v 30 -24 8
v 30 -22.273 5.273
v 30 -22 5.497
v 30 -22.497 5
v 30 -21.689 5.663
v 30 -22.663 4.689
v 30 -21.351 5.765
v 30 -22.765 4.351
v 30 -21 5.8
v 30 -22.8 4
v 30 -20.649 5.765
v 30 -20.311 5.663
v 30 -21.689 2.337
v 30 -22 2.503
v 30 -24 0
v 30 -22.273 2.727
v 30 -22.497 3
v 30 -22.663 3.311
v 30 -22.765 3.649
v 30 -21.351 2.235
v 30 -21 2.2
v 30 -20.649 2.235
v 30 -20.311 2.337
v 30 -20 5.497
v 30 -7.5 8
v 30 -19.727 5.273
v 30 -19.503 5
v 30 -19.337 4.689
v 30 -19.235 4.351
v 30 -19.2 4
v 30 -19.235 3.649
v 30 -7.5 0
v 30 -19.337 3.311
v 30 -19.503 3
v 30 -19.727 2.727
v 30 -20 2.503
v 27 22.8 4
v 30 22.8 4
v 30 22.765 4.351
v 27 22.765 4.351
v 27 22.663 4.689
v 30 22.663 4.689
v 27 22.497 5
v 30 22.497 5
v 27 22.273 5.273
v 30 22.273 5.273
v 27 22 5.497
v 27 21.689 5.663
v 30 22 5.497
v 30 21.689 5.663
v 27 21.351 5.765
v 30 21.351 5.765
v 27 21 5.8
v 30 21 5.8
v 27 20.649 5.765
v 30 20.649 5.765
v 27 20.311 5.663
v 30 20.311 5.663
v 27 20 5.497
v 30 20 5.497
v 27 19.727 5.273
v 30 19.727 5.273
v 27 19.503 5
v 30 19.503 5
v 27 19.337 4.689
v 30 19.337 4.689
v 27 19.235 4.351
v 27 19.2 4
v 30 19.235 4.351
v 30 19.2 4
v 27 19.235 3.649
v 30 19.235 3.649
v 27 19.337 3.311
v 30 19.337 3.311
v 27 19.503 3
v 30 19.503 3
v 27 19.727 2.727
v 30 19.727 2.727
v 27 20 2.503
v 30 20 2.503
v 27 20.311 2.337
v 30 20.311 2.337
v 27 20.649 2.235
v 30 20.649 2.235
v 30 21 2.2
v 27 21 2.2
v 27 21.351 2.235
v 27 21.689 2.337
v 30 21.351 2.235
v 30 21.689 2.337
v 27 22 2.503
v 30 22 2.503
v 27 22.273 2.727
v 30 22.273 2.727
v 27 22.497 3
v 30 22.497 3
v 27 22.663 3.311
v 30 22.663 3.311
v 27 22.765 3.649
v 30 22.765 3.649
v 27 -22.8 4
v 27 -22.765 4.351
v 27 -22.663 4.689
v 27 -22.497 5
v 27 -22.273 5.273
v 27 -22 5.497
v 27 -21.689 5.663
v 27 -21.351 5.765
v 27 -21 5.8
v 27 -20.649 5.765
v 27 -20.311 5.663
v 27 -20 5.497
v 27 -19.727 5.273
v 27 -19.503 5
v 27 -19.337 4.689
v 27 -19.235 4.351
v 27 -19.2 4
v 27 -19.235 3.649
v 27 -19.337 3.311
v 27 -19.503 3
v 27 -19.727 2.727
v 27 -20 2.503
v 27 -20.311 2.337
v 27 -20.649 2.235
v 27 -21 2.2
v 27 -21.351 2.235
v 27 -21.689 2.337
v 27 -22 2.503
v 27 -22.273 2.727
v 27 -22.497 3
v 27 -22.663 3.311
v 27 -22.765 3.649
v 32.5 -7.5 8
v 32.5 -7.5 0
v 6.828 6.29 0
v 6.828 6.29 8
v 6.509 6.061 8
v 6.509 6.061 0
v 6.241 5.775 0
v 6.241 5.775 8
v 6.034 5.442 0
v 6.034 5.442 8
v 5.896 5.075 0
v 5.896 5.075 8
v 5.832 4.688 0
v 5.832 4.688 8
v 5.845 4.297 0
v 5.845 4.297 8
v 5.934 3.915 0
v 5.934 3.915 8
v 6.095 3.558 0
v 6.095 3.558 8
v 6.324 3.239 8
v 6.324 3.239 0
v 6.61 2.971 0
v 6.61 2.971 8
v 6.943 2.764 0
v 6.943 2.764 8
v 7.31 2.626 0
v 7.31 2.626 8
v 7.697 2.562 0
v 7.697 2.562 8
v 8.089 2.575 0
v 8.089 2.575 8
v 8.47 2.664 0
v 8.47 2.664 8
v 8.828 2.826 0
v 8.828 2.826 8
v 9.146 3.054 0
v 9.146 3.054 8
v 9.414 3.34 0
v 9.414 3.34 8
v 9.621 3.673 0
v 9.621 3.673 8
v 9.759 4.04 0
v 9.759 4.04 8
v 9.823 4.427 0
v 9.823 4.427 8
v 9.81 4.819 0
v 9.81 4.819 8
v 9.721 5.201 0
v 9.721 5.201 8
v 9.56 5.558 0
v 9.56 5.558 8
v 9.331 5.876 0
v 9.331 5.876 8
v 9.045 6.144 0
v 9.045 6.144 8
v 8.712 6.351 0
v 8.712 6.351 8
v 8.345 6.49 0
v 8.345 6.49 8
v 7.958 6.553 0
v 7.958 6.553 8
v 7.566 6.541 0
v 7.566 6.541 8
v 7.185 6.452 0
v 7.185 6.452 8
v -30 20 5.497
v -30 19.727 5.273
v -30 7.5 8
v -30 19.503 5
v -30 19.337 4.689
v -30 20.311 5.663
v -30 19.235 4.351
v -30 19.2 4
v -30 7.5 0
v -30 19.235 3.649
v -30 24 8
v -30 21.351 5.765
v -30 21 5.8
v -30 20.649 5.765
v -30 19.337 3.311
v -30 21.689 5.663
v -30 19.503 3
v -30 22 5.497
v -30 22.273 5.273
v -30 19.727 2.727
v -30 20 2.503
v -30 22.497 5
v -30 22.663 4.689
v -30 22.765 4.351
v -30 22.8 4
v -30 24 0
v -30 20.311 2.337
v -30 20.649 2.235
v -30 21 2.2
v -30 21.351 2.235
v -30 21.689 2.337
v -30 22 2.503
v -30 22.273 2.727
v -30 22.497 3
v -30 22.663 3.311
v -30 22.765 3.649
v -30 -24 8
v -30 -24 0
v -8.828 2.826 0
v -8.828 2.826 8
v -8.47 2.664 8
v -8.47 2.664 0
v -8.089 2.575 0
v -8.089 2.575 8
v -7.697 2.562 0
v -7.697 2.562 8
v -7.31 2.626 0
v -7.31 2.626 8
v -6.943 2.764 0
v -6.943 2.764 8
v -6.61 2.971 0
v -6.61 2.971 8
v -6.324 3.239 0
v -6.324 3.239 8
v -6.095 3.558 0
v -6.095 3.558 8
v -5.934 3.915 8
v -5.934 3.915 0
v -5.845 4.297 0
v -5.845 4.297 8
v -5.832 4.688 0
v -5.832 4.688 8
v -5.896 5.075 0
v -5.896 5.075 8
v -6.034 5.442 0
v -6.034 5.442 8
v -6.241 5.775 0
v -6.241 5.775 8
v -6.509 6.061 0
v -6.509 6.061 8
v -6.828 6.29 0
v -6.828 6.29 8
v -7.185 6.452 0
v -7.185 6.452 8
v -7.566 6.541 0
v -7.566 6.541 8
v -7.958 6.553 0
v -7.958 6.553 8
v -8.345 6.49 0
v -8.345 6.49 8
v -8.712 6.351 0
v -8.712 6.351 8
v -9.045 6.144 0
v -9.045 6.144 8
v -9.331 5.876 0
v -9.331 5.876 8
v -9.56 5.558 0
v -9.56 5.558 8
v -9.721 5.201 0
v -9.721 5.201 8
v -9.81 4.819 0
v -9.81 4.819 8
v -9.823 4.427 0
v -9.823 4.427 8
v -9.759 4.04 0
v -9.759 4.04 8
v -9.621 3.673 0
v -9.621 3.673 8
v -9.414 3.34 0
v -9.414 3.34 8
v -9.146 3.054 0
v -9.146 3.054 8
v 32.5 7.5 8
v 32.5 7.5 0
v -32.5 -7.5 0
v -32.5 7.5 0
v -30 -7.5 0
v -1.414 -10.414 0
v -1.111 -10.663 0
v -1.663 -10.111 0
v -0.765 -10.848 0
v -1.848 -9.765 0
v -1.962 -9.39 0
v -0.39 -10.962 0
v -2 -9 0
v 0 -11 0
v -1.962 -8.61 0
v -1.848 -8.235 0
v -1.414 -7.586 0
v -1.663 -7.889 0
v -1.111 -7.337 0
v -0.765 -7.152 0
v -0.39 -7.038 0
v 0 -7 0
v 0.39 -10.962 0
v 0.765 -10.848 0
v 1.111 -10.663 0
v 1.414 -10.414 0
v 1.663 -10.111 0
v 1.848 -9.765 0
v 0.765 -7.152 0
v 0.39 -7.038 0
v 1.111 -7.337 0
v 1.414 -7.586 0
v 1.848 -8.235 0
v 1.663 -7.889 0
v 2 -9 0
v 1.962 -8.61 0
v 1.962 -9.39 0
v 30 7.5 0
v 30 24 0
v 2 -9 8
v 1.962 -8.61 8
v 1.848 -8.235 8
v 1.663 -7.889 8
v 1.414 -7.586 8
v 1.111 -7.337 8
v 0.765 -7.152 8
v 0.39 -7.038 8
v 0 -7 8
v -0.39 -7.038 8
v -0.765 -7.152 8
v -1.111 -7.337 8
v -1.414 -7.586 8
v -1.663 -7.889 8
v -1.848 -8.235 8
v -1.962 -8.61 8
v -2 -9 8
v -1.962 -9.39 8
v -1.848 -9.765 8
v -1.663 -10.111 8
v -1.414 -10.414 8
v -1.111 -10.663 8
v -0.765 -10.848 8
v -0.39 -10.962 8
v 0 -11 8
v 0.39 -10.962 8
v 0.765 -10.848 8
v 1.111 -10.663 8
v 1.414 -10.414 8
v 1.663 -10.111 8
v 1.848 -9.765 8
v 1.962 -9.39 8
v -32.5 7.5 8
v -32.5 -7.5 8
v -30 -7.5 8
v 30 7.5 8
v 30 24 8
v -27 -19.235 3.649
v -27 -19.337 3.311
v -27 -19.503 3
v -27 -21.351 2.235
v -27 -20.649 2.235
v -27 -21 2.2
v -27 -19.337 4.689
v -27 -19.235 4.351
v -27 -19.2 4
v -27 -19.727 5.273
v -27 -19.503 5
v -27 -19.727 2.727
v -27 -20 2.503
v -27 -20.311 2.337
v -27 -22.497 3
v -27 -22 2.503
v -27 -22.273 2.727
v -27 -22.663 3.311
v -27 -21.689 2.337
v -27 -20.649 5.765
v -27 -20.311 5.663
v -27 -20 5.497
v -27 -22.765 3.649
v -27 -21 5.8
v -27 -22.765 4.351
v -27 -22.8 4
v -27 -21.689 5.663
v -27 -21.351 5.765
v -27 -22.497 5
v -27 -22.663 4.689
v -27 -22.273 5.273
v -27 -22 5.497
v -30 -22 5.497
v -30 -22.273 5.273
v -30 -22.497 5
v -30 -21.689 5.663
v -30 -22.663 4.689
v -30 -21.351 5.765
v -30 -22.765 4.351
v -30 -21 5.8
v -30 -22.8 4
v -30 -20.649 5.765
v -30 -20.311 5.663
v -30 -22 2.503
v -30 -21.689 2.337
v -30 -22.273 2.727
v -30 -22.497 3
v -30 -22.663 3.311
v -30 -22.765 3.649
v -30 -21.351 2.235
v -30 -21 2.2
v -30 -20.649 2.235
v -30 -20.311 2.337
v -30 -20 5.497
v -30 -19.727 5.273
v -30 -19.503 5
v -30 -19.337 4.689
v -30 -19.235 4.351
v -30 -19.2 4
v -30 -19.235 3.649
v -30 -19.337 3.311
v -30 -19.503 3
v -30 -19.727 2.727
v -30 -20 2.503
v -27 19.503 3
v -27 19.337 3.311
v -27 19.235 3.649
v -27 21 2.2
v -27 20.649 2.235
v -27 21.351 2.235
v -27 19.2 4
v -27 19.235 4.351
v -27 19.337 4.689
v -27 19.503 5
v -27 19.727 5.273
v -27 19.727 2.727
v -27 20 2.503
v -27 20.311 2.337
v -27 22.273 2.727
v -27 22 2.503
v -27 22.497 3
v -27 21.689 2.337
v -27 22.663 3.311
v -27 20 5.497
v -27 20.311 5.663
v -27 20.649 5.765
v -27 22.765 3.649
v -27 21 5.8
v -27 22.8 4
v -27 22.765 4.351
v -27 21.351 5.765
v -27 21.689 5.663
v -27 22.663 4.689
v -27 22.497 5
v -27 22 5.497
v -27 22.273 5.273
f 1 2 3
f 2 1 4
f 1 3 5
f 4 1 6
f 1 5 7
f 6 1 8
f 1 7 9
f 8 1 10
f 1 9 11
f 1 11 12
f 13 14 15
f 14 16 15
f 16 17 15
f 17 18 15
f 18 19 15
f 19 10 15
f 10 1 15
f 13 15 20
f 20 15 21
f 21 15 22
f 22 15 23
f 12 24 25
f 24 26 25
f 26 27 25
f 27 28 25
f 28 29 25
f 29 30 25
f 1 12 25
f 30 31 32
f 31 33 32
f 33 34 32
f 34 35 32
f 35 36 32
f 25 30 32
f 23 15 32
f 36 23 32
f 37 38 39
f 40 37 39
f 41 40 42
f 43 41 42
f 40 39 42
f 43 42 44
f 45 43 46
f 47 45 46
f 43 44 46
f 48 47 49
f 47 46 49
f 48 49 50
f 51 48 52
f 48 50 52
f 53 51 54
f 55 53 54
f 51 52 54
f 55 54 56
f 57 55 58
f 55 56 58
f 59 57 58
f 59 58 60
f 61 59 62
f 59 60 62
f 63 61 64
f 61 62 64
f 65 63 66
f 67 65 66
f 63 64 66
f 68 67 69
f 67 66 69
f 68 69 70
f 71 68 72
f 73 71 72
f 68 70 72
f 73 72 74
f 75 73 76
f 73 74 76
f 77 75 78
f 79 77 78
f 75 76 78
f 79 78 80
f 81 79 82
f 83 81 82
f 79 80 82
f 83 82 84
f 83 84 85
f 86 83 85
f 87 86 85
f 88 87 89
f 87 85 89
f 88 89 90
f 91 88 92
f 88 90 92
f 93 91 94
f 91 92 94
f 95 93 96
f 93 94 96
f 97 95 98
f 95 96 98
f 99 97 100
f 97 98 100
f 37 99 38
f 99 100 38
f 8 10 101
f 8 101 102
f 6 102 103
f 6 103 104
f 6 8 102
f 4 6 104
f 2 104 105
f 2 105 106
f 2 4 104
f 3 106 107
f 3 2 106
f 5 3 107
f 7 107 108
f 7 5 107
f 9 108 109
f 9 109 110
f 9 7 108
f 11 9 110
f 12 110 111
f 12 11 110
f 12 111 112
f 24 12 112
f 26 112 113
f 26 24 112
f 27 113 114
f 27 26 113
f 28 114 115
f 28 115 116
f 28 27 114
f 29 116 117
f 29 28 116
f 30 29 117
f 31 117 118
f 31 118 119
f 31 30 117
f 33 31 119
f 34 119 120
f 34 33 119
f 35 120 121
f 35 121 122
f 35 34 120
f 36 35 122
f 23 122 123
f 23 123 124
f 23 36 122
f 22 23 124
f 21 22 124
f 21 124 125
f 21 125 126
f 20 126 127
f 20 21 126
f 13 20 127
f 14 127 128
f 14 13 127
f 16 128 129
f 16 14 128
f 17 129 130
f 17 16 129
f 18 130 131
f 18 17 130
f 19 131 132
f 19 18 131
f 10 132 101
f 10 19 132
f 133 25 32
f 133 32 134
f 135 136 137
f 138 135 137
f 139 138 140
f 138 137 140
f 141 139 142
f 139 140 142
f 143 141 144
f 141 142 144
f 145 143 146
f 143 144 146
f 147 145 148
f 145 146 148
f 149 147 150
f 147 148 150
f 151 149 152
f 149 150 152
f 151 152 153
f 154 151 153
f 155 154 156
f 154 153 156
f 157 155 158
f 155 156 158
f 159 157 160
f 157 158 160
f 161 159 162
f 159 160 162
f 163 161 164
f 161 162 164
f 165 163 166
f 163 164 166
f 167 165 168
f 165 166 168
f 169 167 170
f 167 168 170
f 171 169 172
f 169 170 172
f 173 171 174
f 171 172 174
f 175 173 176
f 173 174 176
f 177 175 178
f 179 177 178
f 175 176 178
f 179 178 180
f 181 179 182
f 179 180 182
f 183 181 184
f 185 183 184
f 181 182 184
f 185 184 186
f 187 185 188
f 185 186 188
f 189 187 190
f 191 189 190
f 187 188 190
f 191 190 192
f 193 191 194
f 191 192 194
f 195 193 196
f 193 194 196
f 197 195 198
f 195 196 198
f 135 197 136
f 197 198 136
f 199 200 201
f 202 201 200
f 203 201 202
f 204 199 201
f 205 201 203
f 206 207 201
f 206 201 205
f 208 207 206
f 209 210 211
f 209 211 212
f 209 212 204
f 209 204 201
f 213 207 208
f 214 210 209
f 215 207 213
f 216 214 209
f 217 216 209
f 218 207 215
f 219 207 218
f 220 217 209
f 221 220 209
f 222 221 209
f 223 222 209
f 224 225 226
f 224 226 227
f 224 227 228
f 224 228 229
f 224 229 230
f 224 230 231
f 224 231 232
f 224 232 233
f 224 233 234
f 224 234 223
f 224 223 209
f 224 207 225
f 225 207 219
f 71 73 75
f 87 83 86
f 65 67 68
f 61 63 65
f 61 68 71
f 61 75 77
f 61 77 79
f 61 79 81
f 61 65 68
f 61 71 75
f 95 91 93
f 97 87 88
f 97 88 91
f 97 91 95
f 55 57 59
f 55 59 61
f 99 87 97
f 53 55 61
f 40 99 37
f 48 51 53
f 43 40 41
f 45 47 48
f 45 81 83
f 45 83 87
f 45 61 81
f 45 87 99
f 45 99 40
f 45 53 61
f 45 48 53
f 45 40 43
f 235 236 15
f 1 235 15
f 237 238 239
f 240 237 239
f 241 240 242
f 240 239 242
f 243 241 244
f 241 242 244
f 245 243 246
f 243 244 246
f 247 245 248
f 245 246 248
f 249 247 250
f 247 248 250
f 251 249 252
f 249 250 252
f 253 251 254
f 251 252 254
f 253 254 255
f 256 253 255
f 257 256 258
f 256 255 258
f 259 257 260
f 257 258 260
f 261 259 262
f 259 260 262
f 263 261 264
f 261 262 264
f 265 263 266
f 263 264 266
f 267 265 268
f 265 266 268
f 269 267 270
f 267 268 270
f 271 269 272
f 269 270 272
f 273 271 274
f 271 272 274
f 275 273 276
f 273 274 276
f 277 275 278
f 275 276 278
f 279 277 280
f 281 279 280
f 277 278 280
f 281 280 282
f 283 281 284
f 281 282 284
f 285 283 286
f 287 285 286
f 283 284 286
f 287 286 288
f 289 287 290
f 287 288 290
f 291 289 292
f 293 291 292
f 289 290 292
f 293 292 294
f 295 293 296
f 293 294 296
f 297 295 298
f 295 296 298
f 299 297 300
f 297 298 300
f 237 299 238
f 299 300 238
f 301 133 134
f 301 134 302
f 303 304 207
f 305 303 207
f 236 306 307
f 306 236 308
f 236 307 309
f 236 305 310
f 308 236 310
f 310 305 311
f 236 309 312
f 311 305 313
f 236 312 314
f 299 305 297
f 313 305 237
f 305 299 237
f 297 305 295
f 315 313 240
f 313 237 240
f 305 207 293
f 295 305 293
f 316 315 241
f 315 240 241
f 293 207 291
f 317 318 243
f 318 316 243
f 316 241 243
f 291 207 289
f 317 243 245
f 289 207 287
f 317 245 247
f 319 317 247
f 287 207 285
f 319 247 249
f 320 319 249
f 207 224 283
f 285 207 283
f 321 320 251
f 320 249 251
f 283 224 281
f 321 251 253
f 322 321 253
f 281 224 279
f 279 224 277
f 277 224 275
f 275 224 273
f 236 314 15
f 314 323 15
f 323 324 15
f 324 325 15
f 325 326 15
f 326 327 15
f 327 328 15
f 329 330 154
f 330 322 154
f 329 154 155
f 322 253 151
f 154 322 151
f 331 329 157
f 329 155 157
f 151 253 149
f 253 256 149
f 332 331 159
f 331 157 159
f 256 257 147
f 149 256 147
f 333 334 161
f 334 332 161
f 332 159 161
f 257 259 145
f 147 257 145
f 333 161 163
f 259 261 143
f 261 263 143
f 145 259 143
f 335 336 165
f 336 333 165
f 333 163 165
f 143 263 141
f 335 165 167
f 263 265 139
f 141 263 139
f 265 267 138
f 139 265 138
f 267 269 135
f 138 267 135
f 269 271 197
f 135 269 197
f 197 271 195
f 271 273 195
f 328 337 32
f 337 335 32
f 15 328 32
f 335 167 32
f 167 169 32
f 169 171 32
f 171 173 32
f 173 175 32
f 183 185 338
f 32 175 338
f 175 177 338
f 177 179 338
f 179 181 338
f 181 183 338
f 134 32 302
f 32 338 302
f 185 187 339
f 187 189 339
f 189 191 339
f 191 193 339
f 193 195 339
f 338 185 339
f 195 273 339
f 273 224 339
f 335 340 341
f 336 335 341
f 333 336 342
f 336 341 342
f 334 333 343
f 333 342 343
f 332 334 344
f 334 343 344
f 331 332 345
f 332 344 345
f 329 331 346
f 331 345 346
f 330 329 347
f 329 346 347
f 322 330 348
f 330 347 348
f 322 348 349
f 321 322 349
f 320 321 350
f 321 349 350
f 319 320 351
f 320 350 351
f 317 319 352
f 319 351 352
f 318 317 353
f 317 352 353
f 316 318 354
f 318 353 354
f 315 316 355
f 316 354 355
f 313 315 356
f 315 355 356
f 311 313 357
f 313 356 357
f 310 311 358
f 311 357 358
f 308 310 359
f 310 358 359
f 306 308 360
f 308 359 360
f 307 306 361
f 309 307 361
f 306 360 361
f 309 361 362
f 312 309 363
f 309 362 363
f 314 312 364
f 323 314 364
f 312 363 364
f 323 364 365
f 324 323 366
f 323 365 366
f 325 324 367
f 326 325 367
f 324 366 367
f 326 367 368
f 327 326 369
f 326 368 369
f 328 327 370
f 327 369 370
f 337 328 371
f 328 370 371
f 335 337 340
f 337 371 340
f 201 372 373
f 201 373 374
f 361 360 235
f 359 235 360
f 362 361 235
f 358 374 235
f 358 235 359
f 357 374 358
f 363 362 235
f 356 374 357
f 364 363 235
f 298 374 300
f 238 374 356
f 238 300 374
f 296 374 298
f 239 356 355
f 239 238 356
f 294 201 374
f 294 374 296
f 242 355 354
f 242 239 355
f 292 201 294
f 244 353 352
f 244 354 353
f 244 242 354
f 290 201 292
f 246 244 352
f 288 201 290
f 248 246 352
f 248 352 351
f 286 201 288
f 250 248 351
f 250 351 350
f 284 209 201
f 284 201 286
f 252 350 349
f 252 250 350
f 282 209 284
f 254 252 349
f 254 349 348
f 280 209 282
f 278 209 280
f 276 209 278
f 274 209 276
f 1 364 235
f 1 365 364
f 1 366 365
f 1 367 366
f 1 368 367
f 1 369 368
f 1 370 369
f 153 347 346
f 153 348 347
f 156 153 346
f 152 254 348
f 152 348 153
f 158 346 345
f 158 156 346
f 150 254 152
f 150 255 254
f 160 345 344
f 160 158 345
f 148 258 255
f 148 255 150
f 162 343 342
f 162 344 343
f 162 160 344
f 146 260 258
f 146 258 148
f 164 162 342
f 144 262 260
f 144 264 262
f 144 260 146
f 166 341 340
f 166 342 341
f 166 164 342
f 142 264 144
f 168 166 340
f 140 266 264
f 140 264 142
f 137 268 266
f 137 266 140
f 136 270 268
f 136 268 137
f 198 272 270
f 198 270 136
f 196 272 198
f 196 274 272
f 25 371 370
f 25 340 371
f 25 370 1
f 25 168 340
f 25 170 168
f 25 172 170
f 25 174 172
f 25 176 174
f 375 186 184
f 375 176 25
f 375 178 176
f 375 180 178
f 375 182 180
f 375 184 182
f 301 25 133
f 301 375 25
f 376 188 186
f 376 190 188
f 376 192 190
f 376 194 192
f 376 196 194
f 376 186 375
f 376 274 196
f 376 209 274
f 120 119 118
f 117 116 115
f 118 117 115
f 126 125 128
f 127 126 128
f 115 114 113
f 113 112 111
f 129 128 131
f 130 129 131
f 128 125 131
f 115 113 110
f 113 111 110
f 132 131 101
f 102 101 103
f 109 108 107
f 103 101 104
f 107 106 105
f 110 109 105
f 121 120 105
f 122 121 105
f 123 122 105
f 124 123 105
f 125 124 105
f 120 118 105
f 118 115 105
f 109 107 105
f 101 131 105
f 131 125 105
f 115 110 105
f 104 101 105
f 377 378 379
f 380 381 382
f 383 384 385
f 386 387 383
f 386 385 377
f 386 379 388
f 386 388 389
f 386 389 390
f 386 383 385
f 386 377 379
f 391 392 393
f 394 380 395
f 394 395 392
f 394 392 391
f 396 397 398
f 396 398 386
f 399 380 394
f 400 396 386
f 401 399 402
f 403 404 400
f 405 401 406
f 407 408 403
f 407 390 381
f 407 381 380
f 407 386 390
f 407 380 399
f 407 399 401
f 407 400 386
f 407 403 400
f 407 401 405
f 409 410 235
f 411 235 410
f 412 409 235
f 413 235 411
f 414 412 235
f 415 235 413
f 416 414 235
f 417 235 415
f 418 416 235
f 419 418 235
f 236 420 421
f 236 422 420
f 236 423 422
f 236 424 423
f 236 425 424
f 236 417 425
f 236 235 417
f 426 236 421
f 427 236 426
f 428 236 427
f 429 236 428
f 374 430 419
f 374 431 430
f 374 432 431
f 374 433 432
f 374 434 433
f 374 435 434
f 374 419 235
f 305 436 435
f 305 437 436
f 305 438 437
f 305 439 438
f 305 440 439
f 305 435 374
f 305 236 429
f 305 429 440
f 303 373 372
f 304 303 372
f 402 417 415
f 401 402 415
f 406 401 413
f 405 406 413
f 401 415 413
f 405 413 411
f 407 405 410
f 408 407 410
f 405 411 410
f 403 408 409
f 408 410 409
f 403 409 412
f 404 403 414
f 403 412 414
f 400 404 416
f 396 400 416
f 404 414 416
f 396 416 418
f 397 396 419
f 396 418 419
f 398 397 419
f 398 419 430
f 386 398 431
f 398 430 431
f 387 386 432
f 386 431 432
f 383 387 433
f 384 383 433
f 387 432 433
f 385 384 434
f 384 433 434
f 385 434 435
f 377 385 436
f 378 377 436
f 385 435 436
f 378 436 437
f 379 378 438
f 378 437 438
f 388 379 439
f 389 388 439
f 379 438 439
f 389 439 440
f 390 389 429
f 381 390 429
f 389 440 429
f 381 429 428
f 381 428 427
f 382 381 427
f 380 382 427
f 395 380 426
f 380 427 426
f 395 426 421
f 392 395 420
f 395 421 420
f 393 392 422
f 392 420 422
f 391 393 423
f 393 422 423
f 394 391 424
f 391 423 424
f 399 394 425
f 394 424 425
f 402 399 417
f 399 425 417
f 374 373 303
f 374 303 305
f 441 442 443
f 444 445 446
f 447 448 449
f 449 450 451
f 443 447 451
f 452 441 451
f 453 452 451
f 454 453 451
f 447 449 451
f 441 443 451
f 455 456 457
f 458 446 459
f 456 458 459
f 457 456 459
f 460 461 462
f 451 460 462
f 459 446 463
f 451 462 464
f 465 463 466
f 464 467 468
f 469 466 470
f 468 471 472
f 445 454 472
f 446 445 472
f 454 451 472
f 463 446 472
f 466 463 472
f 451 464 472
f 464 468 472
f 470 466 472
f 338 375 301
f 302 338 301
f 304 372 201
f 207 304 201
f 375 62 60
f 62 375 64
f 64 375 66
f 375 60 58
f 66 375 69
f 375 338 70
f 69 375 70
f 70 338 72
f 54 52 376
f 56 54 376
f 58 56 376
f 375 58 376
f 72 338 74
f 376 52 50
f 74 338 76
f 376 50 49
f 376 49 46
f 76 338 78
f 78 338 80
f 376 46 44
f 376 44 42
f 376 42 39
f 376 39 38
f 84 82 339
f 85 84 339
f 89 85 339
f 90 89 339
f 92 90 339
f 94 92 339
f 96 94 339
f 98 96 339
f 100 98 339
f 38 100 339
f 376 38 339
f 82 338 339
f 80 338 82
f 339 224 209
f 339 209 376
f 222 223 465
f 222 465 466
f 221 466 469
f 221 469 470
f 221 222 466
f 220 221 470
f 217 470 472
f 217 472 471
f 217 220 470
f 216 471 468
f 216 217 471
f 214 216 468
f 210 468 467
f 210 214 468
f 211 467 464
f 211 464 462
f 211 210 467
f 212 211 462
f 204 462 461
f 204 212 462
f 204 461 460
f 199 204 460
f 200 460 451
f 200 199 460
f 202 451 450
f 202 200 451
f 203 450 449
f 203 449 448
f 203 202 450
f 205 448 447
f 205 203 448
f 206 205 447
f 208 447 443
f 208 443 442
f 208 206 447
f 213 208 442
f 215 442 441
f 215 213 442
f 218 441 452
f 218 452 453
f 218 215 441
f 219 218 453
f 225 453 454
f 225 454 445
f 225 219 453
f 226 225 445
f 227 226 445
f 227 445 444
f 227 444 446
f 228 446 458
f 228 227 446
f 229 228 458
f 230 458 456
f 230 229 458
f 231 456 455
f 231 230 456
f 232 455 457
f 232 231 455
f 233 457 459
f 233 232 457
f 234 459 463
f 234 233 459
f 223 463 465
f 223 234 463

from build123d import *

# Parameters (mm, degrees)
SKETCH_1_W               = 60
SKETCH_1_H               = 48
EXTRUDE_1_DEPTH          = 8
SKETCH_2_W               = 65
SKETCH_2_H               = 15
EXTRUDE_2_DEPTH          = 8
SKETCH_3_R               = 2
CUT_EXTRUDE_1_DEPTH      = 8
PATTERN_CIRCULAR_1_COUNT = 3
SKETCH_4_R               = 1.8
CUT_EXTRUDE_2_DEPTH      = 3
MIRROR_2_COPY_1_SKETCH_R = 1.8
MIRROR_2_COPY_1_DEPTH    = 3


with BuildPart() as part:
    # 草图1 → 凸台-拉伸1 (new body)
    with BuildSketch(Plane.XY):
        Rectangle(SKETCH_1_W, SKETCH_1_H)
    extrude(amount=EXTRUDE_1_DEPTH)

    # 草图2 → 凸台-拉伸2 (add)
    with BuildSketch(Plane.XY.offset(8)):
        Rectangle(SKETCH_2_W, SKETCH_2_H)
    extrude(amount=-EXTRUDE_2_DEPTH)

    # 草图3 → 切除-拉伸1 (cut)
    with BuildSketch(Plane.XY.offset(8)):
        with Locations((0, -9)):
            Circle(SKETCH_3_R)
    cut_extrude_1 = extrude(amount=-CUT_EXTRUDE_1_DEPTH, mode=Mode.SUBTRACT)

    # 阵列(圆周)1: 切除-拉伸1 ×3 about axis
    pattern_circular_1_axis = Axis((0, 0.038436665, 0), (0, 0, 1))
    for i in range(1, PATTERN_CIRCULAR_1_COUNT):
        add(cut_extrude_1.rotate(pattern_circular_1_axis, i * 360 / PATTERN_CIRCULAR_1_COUNT), mode=Mode.SUBTRACT)

    # 草图4 → 切除-拉伸2 (cut)
    with BuildSketch(Plane(origin=(30, 0, 0), x_dir=(0, 0, -1), z_dir=(1, 0, 0))):
        with Locations(Location((-4, 21, 0), (0, 0, 90))):
            Circle(SKETCH_4_R)
    cut_extrude_2 = extrude(amount=-CUT_EXTRUDE_2_DEPTH, mode=Mode.SUBTRACT)

    # 镜向1: 切除-拉伸2 across plane
    add(cut_extrude_2.mirror(Plane.ZX), mode=Mode.SUBTRACT)

    # 镜向2: 切除-拉伸2 across plane
    add(cut_extrude_2.mirror(Plane(origin=(0, 0, 0), x_dir=(0, 0, 1), z_dir=(1, 0, 0))), mode=Mode.SUBTRACT)

    # 镜向2 copy 1 sketch → 镜向2 copy 1 (cut)
    with BuildSketch(Plane(origin=(-30, 0, 0), x_dir=(0, 0, -1), z_dir=(-1, 0, 0))):
        with Locations(Location((-4, 21, 0), (0, 0, 90))):
            Circle(MIRROR_2_COPY_1_SKETCH_R)
    extrude(amount=-MIRROR_2_COPY_1_DEPTH, mode=Mode.SUBTRACT)


solid = part.part
